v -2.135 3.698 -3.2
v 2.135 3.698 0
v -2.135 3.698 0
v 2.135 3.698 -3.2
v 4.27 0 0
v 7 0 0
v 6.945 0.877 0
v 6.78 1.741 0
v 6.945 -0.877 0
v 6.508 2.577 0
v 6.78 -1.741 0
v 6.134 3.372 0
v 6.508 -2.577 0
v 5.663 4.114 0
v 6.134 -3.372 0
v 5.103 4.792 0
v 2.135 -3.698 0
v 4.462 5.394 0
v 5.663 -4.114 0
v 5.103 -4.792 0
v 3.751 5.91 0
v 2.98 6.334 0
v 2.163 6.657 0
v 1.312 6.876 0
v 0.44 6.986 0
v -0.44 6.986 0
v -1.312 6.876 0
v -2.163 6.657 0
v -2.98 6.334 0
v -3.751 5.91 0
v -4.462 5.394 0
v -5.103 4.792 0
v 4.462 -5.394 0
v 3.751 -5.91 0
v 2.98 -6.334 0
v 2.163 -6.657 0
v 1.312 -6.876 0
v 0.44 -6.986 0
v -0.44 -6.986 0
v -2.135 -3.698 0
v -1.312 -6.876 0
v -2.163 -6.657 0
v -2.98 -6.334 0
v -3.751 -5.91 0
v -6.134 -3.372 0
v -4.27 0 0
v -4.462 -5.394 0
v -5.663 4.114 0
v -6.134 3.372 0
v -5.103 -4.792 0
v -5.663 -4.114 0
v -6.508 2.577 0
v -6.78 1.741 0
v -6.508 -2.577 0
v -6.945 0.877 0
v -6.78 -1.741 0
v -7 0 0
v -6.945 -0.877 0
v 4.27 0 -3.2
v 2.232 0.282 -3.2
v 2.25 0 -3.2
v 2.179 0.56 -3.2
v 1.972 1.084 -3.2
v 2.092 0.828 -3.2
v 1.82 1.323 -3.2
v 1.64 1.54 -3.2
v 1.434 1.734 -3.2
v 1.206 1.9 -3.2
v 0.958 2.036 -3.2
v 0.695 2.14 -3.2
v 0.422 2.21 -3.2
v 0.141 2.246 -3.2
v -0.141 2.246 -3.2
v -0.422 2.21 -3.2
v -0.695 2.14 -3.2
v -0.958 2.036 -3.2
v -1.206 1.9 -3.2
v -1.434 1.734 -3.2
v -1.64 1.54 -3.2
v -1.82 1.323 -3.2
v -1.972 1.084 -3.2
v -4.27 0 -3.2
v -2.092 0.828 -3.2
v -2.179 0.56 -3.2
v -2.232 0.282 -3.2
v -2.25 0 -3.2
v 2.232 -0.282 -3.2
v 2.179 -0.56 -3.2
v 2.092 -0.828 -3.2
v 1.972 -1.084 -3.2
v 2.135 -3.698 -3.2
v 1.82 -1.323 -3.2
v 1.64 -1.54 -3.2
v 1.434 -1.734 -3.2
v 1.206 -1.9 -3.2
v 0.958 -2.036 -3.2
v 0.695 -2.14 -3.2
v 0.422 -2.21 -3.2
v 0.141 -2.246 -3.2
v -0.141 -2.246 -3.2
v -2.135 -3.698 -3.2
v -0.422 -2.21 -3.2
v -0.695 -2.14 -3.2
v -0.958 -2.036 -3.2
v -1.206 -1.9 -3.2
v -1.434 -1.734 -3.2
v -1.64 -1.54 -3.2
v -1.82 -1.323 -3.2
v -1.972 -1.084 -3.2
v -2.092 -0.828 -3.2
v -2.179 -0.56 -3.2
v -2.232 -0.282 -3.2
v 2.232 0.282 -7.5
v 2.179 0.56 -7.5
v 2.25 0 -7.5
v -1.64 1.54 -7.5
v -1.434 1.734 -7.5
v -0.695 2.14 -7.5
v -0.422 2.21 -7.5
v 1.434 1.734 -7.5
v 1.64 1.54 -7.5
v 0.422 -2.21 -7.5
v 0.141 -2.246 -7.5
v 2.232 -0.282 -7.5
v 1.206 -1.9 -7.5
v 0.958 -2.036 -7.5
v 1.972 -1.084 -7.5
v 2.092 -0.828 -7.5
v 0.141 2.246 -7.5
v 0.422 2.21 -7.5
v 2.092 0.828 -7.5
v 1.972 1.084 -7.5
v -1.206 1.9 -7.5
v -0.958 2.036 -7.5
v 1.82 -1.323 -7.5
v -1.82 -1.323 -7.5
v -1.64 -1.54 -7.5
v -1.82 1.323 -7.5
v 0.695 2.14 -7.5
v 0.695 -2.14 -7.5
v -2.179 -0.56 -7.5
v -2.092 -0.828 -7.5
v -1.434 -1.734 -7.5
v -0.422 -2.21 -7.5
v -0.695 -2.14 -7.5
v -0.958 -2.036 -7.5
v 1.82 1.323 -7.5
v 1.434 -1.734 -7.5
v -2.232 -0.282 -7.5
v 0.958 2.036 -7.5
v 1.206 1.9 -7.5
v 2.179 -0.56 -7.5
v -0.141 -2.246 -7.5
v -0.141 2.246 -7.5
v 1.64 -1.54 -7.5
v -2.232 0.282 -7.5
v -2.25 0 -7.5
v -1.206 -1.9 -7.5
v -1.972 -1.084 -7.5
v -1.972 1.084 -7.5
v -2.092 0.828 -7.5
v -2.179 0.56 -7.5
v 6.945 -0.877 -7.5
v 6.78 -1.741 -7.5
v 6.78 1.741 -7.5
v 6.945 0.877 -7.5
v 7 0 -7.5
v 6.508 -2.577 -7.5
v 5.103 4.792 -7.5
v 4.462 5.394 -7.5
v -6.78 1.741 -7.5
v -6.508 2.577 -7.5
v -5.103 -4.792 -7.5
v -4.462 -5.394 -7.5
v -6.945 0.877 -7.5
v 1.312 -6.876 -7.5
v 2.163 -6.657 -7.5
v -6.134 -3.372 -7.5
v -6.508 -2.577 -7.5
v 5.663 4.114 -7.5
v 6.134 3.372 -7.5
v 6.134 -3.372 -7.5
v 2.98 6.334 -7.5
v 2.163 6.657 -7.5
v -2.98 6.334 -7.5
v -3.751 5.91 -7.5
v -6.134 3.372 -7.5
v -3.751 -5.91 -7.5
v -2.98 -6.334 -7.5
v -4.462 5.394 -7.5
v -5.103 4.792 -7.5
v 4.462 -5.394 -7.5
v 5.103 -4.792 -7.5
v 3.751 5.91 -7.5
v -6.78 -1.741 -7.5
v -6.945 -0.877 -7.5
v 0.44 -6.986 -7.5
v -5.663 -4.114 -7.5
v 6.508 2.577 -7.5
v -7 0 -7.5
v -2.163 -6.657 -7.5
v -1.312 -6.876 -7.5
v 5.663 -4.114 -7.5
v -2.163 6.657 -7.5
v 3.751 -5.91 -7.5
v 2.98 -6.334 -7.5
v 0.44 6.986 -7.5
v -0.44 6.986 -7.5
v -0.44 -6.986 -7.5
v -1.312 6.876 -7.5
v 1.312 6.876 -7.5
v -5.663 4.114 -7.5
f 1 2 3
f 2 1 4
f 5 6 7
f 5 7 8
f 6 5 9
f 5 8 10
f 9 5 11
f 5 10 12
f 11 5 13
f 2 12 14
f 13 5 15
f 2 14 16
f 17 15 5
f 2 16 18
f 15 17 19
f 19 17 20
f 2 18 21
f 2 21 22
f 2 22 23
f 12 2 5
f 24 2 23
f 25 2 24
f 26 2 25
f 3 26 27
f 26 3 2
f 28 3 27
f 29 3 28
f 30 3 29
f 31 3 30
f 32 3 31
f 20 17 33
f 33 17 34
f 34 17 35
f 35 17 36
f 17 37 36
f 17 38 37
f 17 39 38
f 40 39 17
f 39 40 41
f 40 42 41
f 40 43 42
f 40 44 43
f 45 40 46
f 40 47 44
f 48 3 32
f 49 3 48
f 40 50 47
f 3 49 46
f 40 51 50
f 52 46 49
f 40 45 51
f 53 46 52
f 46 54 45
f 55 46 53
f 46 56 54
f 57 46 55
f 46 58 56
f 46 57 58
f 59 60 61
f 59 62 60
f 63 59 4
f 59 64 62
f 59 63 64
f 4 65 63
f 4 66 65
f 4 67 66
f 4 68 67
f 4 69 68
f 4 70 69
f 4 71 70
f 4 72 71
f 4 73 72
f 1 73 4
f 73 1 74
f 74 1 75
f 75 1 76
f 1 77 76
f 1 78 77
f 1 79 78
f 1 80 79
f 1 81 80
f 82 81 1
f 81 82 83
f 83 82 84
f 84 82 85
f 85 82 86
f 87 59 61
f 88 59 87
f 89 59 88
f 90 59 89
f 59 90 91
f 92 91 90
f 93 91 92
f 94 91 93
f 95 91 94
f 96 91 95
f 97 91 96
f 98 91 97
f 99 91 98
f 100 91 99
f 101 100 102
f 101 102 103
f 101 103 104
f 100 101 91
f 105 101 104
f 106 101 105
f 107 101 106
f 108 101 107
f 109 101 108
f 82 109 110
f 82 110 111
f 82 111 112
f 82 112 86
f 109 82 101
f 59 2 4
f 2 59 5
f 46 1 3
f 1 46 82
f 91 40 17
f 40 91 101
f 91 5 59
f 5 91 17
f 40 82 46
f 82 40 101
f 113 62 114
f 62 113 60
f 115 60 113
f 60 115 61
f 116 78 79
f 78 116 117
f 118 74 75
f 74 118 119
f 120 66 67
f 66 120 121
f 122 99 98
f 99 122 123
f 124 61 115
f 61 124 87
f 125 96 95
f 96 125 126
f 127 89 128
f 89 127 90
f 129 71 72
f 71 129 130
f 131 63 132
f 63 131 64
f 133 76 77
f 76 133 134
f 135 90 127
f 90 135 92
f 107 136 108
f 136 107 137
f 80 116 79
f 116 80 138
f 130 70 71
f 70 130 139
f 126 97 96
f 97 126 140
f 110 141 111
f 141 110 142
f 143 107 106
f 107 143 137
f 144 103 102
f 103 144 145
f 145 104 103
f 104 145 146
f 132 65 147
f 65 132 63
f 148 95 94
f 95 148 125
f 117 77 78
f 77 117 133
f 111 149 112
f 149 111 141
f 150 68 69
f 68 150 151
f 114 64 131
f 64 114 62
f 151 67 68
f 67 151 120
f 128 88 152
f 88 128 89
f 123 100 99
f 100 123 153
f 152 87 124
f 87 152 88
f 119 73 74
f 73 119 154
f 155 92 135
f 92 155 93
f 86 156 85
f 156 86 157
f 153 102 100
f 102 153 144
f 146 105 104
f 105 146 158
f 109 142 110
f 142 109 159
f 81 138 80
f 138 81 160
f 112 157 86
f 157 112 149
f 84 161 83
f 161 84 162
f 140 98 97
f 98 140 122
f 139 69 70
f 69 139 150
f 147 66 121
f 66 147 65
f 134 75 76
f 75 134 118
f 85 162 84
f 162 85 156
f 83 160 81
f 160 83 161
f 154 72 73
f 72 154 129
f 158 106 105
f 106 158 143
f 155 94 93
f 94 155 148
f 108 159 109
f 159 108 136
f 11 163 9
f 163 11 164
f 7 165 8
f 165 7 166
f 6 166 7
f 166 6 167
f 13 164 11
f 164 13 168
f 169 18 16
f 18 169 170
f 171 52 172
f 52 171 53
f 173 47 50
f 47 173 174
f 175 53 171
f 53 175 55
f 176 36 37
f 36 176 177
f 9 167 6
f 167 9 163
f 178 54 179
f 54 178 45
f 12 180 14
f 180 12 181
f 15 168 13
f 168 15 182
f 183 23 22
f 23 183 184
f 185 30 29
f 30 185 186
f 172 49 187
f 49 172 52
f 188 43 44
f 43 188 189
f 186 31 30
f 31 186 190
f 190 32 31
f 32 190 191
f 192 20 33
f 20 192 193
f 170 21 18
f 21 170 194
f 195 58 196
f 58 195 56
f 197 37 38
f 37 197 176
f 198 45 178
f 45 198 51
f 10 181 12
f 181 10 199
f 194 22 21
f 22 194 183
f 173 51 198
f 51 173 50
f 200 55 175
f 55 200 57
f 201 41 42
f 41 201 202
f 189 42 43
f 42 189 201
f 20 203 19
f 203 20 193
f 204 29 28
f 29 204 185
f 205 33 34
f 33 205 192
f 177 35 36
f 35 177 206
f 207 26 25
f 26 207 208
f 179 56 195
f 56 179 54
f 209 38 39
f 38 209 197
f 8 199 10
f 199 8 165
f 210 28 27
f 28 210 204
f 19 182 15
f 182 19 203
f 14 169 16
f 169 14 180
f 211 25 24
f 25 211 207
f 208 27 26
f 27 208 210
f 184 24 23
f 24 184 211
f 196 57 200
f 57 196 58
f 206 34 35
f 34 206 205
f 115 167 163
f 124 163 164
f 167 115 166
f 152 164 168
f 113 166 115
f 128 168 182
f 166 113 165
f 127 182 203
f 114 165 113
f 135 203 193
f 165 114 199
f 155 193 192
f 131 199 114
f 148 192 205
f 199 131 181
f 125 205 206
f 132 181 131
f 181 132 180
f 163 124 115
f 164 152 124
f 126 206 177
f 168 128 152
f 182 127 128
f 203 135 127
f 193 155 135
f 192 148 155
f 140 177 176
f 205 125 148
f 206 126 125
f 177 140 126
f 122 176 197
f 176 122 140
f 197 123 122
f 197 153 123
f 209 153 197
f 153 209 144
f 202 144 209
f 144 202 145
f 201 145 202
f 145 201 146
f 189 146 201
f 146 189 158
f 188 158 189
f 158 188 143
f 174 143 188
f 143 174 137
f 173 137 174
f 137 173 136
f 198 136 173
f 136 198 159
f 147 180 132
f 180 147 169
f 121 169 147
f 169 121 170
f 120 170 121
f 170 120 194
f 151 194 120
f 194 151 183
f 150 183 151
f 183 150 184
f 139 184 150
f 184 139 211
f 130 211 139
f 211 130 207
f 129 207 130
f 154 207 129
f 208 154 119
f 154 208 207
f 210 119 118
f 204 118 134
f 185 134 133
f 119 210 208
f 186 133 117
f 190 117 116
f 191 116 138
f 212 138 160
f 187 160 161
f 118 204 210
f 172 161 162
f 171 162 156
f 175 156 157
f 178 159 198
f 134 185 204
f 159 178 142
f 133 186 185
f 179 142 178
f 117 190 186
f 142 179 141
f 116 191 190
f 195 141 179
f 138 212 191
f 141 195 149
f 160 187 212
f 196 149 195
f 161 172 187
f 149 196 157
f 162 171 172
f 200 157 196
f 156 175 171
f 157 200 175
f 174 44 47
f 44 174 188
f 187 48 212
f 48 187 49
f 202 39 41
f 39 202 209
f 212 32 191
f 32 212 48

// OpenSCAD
$fn = 50;

difference() {
	union() {
		translate(v = [0, 0, -7.5]) {
			cylinder(h = 7.5, r = 7.0);
		}
	}
	union() {
		translate(v = [0, 0, 0]) {
			rotate(a = [0, 0, 0]) {
				difference() {
					union() {
						translate(v = [0, 0, -3.2]) {
							linear_extrude(height = 3.2) {
								polygon(points = [[4.2698, 0.0], [2.1349000000000005, 3.697755269078796], [-2.134899999999999, 3.6977552690787965], [-4.2698, 5.228996902999369e-16], [-2.134900000000002, -3.6977552690787956], [2.1348999999999974, -3.697755269078798]]);
							}
						}
					}
					union();
				}
			}
		}
		#translate(v = [0, 0, -100.0]) {
			cylinder(h = 200, r = 2.25);
		}
	}
}
